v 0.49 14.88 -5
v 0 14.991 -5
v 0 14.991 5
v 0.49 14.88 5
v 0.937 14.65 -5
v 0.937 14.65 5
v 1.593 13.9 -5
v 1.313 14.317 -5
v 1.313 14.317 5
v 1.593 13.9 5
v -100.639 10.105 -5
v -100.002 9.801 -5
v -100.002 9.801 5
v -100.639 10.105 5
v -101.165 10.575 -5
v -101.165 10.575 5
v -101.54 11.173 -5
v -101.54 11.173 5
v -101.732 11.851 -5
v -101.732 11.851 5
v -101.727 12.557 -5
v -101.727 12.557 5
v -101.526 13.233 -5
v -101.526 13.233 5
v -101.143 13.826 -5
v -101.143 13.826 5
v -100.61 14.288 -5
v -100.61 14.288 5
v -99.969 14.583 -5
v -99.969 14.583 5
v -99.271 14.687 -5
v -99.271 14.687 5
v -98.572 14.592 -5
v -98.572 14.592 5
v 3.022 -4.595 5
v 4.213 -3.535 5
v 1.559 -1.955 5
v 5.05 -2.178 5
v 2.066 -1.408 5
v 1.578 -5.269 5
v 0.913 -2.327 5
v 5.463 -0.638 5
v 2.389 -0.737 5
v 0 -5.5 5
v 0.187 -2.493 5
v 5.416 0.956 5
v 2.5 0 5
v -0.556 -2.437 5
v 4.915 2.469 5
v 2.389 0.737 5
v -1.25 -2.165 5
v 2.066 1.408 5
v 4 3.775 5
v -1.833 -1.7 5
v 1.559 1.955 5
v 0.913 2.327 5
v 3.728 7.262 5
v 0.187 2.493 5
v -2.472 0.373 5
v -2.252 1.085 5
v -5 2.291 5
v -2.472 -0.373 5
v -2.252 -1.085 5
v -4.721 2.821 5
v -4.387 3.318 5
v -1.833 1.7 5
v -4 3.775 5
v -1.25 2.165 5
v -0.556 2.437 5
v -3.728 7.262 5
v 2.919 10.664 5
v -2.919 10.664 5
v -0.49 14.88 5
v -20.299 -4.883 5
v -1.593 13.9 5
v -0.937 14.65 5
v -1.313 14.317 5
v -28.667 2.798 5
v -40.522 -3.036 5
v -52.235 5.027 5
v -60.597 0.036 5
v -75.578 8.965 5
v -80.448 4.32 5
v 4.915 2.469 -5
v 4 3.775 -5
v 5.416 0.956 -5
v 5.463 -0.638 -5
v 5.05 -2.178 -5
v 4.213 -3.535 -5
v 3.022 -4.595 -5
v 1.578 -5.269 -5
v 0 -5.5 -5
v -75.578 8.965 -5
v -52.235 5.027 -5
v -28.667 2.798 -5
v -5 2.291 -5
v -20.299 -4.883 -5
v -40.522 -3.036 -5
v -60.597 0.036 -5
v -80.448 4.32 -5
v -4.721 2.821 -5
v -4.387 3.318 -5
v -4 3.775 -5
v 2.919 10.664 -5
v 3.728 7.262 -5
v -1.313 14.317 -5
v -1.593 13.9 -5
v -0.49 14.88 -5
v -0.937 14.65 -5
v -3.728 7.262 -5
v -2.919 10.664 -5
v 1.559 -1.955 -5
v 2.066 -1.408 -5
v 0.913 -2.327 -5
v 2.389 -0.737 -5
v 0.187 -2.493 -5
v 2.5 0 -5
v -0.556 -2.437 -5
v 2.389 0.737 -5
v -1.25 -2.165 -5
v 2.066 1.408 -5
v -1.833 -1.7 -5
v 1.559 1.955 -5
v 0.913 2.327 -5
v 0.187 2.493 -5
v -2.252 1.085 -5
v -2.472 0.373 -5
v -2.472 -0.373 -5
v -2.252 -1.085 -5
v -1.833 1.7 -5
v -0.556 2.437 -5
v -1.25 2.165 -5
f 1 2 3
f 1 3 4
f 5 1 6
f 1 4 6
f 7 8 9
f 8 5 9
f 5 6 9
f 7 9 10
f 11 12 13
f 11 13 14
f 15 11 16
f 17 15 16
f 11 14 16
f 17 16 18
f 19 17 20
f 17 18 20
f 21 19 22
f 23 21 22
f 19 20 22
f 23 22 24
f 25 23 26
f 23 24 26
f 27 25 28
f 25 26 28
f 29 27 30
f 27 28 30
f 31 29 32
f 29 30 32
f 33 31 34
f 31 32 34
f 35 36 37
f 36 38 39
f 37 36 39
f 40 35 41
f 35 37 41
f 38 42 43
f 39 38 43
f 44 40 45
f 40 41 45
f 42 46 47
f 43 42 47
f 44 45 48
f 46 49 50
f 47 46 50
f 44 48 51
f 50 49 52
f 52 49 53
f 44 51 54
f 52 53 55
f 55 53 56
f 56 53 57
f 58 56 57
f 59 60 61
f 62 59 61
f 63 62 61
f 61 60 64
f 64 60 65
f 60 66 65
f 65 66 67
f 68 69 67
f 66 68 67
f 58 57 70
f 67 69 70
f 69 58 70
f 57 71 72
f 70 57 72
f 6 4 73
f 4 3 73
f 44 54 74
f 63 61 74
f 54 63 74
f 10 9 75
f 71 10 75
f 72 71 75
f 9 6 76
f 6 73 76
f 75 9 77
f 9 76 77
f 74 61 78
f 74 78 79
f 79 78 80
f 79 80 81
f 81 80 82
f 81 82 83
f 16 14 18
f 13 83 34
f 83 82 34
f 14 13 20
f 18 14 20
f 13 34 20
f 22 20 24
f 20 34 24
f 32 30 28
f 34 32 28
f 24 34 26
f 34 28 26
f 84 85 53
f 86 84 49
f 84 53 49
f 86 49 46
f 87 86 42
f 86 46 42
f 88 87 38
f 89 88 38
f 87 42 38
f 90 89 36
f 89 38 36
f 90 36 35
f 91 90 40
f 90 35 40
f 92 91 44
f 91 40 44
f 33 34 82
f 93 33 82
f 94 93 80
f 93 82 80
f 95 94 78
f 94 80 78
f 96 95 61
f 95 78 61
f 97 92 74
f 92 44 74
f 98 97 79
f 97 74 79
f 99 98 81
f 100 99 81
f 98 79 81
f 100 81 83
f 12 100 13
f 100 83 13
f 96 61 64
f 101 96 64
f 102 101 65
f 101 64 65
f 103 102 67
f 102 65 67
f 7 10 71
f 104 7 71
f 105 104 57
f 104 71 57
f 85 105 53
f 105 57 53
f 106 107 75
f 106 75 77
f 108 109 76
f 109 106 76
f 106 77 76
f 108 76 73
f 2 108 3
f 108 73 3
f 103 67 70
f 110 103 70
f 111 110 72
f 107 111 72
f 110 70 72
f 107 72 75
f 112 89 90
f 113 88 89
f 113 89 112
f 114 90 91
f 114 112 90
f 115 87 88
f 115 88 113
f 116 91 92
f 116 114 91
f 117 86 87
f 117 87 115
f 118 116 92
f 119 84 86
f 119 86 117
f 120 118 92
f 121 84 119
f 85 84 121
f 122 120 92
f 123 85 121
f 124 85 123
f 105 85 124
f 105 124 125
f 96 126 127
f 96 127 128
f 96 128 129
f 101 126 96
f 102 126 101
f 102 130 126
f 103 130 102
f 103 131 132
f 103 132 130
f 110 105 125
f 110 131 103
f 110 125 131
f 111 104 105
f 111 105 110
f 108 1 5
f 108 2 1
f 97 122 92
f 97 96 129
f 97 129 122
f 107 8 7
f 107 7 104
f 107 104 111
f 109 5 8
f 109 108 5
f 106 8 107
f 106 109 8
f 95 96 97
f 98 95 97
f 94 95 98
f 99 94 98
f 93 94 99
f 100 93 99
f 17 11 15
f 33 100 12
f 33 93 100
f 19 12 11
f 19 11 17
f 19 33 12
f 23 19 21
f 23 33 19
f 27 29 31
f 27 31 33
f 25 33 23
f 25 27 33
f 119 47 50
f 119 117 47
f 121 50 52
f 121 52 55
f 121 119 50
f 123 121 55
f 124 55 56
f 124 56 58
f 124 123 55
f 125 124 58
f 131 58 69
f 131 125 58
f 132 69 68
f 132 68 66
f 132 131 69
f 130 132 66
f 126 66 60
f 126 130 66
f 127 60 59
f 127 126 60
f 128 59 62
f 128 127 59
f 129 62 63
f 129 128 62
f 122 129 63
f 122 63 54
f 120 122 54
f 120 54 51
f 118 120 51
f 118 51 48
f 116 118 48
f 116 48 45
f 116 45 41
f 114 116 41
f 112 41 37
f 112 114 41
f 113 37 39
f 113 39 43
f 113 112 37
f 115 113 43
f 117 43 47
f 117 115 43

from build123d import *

# Parameters (mm, degrees)
SKETCH2_R           = 2.5
BOSS_EXTRUDE1_DEPTH = 5
FILLET1_R           = 2


with BuildPart() as part:
    # Sketch2 → Boss-Extrude1 (new, symmetric)
    with BuildSketch(Plane.XY):
        with BuildLine():
            Line((-1, 15), (1, 15))
            ThreePointArc((1, 15), (3.237065366, 9.584445672), (4, 3.774917218))
            ThreePointArc((4, 3.774917218), (5.050348735, -2.178067412), (0, -5.5))
            ThreePointArc((0, -5.5), (-50.58302006, -1.652596692), (-100.002221288, 9.801091818))
            ThreePointArc((-100.002221288, 9.801091818), (-101.650418114, 12.901978174), (-98.572266253, 14.592253326))
            ThreePointArc((-98.572266253, 14.592253326), (-52.235024066, 5.027100207), (-5, 2.291287847))
            ThreePointArc((-5, 2.291287847), (-4.560733387, 3.074038219), (-4, 3.774917218))
            ThreePointArc((-4, 3.774917218), (-3.237065366, 9.584445672), (-1, 15))
        make_face()
        Circle(SKETCH2_R, mode=Mode.SUBTRACT)
    extrude(amount=BOSS_EXTRUDE1_DEPTH, both=True)

    # Fillet1
    # the kernel refuses this fillet: 2 mm, written as the material it takes off along each edge
    with BuildSketch(Plane(origin=(1, 15, 8.124355519), x_dir=(0.4746222349820919, -0.8801896011999936, 0), z_dir=(0, 0, -1))) as fillet1_piece_1:
        with BuildLine():
            CenterArc((1.194199131, 1.999228593), FILLET1_R, 208.334756637, 63.256639898)
            Line((-0.566180071, 1.049984123), (0, 0))
            ThreePointArc((0, 0), (0.624871104, -0.00867849), (1.249742207, 0))
        make_face()
    extrude(amount=16.248711037, mode=Mode.SUBTRACT)
    with BuildSketch(Plane(origin=(-1, 15, 8.124355519), x_dir=(1, 0, 0), z_dir=(0, 0, -1))) as fillet1_piece_2:
        with BuildLine():
            CenterArc((1.192906757, 2), FILLET1_R, 206.743360102, 63.256639898)
            ThreePointArc((-0.59315544, 1.100010095), (-0.304216436, 0.545886044), (0, 0))
            Line((0, 0), (1.192906757, 0))
        make_face()
    extrude(amount=16.248711037, mode=Mode.SUBTRACT)


solid = part.part
